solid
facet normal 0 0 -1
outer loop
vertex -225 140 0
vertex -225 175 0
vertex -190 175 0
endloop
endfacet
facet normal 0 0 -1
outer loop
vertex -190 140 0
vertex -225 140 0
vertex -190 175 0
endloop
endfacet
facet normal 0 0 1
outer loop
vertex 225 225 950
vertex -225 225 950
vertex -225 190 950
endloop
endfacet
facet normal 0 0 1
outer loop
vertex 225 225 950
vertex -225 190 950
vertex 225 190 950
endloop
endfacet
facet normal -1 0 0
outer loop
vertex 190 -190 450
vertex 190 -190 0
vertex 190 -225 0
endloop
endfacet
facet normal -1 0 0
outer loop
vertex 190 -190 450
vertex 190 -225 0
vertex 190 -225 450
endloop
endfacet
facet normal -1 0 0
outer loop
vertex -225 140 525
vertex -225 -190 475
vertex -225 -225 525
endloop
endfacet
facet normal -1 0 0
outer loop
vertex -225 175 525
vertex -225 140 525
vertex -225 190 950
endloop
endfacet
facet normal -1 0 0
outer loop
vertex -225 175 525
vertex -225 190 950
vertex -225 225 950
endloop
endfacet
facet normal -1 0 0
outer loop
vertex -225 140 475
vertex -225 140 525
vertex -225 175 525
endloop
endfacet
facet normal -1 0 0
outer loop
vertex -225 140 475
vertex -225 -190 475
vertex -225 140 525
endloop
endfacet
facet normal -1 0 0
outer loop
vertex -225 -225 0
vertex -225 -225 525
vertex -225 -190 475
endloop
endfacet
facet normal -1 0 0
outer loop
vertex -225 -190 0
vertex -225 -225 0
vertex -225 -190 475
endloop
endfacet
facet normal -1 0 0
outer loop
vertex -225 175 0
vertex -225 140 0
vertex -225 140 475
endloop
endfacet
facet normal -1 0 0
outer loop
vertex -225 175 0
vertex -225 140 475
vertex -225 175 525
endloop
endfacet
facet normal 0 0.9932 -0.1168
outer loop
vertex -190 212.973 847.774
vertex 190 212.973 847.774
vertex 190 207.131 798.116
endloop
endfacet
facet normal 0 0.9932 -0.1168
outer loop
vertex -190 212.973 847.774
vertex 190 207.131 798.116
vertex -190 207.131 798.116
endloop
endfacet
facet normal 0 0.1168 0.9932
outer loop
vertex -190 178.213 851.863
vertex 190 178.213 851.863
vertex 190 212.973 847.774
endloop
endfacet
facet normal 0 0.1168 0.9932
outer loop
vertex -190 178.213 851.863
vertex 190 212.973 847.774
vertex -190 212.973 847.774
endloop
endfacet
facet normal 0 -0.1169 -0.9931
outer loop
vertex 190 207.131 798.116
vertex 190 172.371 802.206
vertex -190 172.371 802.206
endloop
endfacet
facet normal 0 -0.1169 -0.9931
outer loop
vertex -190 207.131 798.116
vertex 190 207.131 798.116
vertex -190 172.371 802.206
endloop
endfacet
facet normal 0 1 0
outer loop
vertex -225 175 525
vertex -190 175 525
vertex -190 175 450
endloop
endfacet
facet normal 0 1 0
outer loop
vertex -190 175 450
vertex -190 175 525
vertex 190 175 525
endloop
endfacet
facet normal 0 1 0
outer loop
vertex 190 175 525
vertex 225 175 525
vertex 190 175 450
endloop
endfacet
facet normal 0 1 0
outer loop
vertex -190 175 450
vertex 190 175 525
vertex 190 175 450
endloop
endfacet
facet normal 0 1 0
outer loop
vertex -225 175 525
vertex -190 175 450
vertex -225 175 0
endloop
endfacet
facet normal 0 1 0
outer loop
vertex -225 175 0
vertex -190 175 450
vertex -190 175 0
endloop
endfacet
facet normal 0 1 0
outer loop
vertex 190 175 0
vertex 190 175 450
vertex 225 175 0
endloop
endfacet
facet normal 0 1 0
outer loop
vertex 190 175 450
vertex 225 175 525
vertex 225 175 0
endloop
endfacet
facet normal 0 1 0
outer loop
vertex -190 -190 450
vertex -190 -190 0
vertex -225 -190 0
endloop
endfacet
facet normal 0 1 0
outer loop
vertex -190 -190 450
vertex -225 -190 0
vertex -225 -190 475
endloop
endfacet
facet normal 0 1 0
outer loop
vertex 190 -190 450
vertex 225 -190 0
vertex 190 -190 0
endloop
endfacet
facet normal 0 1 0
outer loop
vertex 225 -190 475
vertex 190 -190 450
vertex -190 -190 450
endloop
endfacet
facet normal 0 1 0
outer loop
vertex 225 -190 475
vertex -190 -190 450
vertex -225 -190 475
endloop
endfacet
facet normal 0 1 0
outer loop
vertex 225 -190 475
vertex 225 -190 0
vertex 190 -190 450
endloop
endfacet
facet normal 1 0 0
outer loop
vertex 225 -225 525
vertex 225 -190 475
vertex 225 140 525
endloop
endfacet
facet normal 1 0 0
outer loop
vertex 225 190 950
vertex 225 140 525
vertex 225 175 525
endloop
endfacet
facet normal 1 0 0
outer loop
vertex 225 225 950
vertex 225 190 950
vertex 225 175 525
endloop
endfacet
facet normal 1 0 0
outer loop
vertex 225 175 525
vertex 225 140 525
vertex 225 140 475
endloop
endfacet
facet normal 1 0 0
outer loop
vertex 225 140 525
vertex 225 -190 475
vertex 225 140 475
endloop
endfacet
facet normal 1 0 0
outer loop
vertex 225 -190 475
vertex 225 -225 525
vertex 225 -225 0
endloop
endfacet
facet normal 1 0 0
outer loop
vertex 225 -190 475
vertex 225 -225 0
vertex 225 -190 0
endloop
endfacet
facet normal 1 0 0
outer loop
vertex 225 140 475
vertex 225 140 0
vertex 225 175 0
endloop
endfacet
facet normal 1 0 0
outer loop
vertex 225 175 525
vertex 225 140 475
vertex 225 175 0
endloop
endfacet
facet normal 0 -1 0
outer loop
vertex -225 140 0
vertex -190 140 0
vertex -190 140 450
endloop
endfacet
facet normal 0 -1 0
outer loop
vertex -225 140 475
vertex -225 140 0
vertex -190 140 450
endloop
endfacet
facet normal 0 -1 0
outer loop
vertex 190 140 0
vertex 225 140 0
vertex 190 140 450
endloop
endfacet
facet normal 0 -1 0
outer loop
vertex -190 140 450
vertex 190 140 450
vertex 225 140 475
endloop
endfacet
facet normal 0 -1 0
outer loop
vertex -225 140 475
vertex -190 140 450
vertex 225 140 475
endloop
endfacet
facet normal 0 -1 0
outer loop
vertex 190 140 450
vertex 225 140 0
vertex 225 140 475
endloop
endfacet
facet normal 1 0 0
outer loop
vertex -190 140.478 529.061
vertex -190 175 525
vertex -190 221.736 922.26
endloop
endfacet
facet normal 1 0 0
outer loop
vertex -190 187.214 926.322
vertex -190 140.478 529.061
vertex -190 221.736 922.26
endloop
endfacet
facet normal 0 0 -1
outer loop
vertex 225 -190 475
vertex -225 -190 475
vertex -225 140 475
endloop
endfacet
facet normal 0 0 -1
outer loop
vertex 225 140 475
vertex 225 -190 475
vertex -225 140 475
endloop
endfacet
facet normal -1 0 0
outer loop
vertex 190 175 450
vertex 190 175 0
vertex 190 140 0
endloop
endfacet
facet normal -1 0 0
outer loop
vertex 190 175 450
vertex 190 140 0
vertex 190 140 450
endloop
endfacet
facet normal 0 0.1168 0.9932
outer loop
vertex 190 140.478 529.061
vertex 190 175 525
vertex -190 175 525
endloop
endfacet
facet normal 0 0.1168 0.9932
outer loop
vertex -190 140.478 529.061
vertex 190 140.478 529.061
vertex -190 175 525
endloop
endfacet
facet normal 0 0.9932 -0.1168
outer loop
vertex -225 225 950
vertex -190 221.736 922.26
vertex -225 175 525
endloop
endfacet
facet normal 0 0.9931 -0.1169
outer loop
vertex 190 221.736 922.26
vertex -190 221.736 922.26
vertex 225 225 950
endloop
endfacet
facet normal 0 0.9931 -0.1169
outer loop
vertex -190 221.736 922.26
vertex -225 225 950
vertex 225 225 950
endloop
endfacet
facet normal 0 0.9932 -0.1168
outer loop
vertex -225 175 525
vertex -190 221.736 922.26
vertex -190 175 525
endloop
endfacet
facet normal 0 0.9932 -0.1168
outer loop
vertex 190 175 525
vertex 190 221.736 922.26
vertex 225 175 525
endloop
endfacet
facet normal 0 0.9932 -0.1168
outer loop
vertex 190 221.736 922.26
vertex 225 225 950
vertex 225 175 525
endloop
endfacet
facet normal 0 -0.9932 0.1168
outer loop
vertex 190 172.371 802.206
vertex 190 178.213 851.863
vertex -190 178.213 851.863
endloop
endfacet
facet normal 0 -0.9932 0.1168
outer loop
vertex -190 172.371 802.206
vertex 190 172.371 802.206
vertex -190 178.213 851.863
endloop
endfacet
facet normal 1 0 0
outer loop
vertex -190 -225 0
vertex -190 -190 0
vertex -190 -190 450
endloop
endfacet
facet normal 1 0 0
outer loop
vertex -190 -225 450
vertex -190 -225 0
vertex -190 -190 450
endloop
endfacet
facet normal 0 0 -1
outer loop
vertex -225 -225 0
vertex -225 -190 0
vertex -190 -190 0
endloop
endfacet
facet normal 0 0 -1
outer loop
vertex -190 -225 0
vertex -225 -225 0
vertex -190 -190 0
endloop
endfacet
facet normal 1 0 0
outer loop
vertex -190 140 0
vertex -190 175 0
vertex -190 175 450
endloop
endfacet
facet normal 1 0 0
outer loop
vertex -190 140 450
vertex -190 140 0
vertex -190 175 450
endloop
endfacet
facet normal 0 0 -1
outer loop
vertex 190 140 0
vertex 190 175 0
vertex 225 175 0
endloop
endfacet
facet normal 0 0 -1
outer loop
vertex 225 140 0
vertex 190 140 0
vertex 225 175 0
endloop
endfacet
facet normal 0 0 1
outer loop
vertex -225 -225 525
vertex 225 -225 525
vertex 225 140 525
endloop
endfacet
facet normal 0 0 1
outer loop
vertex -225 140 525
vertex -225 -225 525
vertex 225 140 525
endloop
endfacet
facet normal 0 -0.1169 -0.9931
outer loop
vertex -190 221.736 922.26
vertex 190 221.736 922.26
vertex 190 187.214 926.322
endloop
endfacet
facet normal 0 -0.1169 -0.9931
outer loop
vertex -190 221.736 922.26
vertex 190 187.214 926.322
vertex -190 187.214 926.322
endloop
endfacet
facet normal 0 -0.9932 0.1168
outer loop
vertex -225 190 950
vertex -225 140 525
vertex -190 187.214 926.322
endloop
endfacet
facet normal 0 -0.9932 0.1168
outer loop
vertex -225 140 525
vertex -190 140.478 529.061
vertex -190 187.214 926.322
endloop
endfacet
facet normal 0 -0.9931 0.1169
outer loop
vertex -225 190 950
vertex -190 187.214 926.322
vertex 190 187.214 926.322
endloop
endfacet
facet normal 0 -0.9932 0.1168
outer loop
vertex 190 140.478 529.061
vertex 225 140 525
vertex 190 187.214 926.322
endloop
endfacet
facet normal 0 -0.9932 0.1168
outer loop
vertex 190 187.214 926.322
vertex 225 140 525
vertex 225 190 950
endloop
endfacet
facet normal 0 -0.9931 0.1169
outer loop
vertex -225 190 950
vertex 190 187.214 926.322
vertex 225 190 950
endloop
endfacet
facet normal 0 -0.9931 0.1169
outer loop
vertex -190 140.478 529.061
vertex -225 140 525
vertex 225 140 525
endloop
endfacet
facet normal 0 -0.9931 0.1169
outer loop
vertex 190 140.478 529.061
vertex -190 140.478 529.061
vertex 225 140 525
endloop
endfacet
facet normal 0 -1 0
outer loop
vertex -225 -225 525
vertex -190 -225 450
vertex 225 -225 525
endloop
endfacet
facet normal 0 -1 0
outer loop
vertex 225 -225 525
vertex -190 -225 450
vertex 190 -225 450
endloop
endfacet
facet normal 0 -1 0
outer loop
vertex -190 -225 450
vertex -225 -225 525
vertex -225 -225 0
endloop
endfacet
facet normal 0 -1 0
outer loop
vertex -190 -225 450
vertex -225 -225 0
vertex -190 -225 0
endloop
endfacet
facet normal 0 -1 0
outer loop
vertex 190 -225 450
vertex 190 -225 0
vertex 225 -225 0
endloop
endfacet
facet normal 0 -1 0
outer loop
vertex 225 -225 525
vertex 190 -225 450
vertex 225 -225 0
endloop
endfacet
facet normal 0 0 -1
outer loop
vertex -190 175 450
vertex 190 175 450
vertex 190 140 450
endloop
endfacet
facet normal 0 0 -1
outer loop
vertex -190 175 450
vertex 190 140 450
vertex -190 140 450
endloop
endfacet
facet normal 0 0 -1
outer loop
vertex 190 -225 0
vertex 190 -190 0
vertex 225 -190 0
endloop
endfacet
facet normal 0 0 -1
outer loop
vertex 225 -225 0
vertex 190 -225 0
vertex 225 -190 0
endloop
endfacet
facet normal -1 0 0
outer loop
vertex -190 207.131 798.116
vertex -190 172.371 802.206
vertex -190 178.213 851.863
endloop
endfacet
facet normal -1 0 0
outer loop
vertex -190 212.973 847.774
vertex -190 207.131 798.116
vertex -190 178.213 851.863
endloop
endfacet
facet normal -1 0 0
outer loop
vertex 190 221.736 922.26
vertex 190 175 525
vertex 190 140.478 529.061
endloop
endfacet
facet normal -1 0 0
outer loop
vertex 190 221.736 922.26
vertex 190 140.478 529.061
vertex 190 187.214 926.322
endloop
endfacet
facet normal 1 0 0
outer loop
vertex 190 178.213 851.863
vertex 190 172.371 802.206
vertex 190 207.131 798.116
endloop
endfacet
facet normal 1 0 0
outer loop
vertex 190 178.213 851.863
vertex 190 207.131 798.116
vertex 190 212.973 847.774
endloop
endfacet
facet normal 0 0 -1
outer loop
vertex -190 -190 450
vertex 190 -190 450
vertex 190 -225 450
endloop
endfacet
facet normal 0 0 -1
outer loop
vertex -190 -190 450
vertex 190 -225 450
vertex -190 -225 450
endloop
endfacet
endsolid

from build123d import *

# Parameters (mm, degrees)
F0_W      = 450
F0_H      = 450
F1_DEPTH  = 950
F2_W      = 50
F2_H      = 50
F2_W_2    = 330
F2_H_2    = 475
F3_DEPTH  = 450.001
F4_W      = 380
F4_H      = 450
F5_DEPTH  = 400.001
F6_W      = 380
F6_H      = 400
F7_DEPTH  = 446.9187719453
F8_W      = 380
F8_H      = 50
F9_DEPTH  = 35
F10_DEPTH = 25


with BuildPart() as f1:
    # F0 (on Top) → F1 (new body)
    with BuildSketch(Plane.XY):
        Rectangle(F0_W, F0_H)
    extrude(amount=F1_DEPTH)

    # F2 (on face) → F3 (cut, through all)
    with BuildSketch(Plane.YZ.offset(225)):
        with Locations((200, 500)):
            Rectangle(F2_W, F2_H)
        Polygon((-225, 950), (-225, 525), (-190, 525), (140, 525), (190, 950), align=None)
        with Locations((-25, 237.5)):
            Rectangle(F2_W_2, F2_H_2)
        with Locations((200, 237.5)):
            Rectangle(F2_W, F2_H_2)
        Polygon((225, 950), (175, 525), (225, 525), align=None)
    extrude(amount=-F3_DEPTH, mode=Mode.SUBTRACT)

    # F4 (on face) → F5 (cut, through all)
    with BuildSketch(Plane(origin=(0, 175, 0), x_dir=(-1, 0, 0), z_dir=(0, 1, 0))):
        with Locations((0, 225)):
            Rectangle(F4_W, F4_H)
    extrude(amount=-F5_DEPTH, mode=Mode.SUBTRACT)

    # F6 (on face) → F7 (cut, through all)
    with BuildSketch(Plane(origin=(0, 111.6894197952, -13.1399317406), x_dir=(-1, 0, 0), z_dir=(0, 0.9931506043, -0.1168412476))):
        with Locations((0, 741.8512855938)):
            Rectangle(F6_W, F6_H)
    extrude(amount=-F7_DEPTH, mode=Mode.SUBTRACT)


with BuildPart() as f9:
    # F8 (on face) → F9 (new body)
    with BuildSketch(Plane(origin=(0, 111.6894197952, -13.1399317406), x_dir=(-1, 0, 0), z_dir=(0, 0.9931506043, -0.1168412476))):
        with Locations((0, 841.8512855938)):
            Rectangle(F8_W, F8_H)
    extrude(amount=-F9_DEPTH)

    # F10 (add): a face of the model
    f10_faces = [f9.faces().sort_by_distance(p)[0] for p in [
        (0, 175.2921031189, 827.0346249617),
    ]]
    extrude(f10_faces, amount=-F10_DEPTH)


solid = Compound([f1.part, f9.part])
